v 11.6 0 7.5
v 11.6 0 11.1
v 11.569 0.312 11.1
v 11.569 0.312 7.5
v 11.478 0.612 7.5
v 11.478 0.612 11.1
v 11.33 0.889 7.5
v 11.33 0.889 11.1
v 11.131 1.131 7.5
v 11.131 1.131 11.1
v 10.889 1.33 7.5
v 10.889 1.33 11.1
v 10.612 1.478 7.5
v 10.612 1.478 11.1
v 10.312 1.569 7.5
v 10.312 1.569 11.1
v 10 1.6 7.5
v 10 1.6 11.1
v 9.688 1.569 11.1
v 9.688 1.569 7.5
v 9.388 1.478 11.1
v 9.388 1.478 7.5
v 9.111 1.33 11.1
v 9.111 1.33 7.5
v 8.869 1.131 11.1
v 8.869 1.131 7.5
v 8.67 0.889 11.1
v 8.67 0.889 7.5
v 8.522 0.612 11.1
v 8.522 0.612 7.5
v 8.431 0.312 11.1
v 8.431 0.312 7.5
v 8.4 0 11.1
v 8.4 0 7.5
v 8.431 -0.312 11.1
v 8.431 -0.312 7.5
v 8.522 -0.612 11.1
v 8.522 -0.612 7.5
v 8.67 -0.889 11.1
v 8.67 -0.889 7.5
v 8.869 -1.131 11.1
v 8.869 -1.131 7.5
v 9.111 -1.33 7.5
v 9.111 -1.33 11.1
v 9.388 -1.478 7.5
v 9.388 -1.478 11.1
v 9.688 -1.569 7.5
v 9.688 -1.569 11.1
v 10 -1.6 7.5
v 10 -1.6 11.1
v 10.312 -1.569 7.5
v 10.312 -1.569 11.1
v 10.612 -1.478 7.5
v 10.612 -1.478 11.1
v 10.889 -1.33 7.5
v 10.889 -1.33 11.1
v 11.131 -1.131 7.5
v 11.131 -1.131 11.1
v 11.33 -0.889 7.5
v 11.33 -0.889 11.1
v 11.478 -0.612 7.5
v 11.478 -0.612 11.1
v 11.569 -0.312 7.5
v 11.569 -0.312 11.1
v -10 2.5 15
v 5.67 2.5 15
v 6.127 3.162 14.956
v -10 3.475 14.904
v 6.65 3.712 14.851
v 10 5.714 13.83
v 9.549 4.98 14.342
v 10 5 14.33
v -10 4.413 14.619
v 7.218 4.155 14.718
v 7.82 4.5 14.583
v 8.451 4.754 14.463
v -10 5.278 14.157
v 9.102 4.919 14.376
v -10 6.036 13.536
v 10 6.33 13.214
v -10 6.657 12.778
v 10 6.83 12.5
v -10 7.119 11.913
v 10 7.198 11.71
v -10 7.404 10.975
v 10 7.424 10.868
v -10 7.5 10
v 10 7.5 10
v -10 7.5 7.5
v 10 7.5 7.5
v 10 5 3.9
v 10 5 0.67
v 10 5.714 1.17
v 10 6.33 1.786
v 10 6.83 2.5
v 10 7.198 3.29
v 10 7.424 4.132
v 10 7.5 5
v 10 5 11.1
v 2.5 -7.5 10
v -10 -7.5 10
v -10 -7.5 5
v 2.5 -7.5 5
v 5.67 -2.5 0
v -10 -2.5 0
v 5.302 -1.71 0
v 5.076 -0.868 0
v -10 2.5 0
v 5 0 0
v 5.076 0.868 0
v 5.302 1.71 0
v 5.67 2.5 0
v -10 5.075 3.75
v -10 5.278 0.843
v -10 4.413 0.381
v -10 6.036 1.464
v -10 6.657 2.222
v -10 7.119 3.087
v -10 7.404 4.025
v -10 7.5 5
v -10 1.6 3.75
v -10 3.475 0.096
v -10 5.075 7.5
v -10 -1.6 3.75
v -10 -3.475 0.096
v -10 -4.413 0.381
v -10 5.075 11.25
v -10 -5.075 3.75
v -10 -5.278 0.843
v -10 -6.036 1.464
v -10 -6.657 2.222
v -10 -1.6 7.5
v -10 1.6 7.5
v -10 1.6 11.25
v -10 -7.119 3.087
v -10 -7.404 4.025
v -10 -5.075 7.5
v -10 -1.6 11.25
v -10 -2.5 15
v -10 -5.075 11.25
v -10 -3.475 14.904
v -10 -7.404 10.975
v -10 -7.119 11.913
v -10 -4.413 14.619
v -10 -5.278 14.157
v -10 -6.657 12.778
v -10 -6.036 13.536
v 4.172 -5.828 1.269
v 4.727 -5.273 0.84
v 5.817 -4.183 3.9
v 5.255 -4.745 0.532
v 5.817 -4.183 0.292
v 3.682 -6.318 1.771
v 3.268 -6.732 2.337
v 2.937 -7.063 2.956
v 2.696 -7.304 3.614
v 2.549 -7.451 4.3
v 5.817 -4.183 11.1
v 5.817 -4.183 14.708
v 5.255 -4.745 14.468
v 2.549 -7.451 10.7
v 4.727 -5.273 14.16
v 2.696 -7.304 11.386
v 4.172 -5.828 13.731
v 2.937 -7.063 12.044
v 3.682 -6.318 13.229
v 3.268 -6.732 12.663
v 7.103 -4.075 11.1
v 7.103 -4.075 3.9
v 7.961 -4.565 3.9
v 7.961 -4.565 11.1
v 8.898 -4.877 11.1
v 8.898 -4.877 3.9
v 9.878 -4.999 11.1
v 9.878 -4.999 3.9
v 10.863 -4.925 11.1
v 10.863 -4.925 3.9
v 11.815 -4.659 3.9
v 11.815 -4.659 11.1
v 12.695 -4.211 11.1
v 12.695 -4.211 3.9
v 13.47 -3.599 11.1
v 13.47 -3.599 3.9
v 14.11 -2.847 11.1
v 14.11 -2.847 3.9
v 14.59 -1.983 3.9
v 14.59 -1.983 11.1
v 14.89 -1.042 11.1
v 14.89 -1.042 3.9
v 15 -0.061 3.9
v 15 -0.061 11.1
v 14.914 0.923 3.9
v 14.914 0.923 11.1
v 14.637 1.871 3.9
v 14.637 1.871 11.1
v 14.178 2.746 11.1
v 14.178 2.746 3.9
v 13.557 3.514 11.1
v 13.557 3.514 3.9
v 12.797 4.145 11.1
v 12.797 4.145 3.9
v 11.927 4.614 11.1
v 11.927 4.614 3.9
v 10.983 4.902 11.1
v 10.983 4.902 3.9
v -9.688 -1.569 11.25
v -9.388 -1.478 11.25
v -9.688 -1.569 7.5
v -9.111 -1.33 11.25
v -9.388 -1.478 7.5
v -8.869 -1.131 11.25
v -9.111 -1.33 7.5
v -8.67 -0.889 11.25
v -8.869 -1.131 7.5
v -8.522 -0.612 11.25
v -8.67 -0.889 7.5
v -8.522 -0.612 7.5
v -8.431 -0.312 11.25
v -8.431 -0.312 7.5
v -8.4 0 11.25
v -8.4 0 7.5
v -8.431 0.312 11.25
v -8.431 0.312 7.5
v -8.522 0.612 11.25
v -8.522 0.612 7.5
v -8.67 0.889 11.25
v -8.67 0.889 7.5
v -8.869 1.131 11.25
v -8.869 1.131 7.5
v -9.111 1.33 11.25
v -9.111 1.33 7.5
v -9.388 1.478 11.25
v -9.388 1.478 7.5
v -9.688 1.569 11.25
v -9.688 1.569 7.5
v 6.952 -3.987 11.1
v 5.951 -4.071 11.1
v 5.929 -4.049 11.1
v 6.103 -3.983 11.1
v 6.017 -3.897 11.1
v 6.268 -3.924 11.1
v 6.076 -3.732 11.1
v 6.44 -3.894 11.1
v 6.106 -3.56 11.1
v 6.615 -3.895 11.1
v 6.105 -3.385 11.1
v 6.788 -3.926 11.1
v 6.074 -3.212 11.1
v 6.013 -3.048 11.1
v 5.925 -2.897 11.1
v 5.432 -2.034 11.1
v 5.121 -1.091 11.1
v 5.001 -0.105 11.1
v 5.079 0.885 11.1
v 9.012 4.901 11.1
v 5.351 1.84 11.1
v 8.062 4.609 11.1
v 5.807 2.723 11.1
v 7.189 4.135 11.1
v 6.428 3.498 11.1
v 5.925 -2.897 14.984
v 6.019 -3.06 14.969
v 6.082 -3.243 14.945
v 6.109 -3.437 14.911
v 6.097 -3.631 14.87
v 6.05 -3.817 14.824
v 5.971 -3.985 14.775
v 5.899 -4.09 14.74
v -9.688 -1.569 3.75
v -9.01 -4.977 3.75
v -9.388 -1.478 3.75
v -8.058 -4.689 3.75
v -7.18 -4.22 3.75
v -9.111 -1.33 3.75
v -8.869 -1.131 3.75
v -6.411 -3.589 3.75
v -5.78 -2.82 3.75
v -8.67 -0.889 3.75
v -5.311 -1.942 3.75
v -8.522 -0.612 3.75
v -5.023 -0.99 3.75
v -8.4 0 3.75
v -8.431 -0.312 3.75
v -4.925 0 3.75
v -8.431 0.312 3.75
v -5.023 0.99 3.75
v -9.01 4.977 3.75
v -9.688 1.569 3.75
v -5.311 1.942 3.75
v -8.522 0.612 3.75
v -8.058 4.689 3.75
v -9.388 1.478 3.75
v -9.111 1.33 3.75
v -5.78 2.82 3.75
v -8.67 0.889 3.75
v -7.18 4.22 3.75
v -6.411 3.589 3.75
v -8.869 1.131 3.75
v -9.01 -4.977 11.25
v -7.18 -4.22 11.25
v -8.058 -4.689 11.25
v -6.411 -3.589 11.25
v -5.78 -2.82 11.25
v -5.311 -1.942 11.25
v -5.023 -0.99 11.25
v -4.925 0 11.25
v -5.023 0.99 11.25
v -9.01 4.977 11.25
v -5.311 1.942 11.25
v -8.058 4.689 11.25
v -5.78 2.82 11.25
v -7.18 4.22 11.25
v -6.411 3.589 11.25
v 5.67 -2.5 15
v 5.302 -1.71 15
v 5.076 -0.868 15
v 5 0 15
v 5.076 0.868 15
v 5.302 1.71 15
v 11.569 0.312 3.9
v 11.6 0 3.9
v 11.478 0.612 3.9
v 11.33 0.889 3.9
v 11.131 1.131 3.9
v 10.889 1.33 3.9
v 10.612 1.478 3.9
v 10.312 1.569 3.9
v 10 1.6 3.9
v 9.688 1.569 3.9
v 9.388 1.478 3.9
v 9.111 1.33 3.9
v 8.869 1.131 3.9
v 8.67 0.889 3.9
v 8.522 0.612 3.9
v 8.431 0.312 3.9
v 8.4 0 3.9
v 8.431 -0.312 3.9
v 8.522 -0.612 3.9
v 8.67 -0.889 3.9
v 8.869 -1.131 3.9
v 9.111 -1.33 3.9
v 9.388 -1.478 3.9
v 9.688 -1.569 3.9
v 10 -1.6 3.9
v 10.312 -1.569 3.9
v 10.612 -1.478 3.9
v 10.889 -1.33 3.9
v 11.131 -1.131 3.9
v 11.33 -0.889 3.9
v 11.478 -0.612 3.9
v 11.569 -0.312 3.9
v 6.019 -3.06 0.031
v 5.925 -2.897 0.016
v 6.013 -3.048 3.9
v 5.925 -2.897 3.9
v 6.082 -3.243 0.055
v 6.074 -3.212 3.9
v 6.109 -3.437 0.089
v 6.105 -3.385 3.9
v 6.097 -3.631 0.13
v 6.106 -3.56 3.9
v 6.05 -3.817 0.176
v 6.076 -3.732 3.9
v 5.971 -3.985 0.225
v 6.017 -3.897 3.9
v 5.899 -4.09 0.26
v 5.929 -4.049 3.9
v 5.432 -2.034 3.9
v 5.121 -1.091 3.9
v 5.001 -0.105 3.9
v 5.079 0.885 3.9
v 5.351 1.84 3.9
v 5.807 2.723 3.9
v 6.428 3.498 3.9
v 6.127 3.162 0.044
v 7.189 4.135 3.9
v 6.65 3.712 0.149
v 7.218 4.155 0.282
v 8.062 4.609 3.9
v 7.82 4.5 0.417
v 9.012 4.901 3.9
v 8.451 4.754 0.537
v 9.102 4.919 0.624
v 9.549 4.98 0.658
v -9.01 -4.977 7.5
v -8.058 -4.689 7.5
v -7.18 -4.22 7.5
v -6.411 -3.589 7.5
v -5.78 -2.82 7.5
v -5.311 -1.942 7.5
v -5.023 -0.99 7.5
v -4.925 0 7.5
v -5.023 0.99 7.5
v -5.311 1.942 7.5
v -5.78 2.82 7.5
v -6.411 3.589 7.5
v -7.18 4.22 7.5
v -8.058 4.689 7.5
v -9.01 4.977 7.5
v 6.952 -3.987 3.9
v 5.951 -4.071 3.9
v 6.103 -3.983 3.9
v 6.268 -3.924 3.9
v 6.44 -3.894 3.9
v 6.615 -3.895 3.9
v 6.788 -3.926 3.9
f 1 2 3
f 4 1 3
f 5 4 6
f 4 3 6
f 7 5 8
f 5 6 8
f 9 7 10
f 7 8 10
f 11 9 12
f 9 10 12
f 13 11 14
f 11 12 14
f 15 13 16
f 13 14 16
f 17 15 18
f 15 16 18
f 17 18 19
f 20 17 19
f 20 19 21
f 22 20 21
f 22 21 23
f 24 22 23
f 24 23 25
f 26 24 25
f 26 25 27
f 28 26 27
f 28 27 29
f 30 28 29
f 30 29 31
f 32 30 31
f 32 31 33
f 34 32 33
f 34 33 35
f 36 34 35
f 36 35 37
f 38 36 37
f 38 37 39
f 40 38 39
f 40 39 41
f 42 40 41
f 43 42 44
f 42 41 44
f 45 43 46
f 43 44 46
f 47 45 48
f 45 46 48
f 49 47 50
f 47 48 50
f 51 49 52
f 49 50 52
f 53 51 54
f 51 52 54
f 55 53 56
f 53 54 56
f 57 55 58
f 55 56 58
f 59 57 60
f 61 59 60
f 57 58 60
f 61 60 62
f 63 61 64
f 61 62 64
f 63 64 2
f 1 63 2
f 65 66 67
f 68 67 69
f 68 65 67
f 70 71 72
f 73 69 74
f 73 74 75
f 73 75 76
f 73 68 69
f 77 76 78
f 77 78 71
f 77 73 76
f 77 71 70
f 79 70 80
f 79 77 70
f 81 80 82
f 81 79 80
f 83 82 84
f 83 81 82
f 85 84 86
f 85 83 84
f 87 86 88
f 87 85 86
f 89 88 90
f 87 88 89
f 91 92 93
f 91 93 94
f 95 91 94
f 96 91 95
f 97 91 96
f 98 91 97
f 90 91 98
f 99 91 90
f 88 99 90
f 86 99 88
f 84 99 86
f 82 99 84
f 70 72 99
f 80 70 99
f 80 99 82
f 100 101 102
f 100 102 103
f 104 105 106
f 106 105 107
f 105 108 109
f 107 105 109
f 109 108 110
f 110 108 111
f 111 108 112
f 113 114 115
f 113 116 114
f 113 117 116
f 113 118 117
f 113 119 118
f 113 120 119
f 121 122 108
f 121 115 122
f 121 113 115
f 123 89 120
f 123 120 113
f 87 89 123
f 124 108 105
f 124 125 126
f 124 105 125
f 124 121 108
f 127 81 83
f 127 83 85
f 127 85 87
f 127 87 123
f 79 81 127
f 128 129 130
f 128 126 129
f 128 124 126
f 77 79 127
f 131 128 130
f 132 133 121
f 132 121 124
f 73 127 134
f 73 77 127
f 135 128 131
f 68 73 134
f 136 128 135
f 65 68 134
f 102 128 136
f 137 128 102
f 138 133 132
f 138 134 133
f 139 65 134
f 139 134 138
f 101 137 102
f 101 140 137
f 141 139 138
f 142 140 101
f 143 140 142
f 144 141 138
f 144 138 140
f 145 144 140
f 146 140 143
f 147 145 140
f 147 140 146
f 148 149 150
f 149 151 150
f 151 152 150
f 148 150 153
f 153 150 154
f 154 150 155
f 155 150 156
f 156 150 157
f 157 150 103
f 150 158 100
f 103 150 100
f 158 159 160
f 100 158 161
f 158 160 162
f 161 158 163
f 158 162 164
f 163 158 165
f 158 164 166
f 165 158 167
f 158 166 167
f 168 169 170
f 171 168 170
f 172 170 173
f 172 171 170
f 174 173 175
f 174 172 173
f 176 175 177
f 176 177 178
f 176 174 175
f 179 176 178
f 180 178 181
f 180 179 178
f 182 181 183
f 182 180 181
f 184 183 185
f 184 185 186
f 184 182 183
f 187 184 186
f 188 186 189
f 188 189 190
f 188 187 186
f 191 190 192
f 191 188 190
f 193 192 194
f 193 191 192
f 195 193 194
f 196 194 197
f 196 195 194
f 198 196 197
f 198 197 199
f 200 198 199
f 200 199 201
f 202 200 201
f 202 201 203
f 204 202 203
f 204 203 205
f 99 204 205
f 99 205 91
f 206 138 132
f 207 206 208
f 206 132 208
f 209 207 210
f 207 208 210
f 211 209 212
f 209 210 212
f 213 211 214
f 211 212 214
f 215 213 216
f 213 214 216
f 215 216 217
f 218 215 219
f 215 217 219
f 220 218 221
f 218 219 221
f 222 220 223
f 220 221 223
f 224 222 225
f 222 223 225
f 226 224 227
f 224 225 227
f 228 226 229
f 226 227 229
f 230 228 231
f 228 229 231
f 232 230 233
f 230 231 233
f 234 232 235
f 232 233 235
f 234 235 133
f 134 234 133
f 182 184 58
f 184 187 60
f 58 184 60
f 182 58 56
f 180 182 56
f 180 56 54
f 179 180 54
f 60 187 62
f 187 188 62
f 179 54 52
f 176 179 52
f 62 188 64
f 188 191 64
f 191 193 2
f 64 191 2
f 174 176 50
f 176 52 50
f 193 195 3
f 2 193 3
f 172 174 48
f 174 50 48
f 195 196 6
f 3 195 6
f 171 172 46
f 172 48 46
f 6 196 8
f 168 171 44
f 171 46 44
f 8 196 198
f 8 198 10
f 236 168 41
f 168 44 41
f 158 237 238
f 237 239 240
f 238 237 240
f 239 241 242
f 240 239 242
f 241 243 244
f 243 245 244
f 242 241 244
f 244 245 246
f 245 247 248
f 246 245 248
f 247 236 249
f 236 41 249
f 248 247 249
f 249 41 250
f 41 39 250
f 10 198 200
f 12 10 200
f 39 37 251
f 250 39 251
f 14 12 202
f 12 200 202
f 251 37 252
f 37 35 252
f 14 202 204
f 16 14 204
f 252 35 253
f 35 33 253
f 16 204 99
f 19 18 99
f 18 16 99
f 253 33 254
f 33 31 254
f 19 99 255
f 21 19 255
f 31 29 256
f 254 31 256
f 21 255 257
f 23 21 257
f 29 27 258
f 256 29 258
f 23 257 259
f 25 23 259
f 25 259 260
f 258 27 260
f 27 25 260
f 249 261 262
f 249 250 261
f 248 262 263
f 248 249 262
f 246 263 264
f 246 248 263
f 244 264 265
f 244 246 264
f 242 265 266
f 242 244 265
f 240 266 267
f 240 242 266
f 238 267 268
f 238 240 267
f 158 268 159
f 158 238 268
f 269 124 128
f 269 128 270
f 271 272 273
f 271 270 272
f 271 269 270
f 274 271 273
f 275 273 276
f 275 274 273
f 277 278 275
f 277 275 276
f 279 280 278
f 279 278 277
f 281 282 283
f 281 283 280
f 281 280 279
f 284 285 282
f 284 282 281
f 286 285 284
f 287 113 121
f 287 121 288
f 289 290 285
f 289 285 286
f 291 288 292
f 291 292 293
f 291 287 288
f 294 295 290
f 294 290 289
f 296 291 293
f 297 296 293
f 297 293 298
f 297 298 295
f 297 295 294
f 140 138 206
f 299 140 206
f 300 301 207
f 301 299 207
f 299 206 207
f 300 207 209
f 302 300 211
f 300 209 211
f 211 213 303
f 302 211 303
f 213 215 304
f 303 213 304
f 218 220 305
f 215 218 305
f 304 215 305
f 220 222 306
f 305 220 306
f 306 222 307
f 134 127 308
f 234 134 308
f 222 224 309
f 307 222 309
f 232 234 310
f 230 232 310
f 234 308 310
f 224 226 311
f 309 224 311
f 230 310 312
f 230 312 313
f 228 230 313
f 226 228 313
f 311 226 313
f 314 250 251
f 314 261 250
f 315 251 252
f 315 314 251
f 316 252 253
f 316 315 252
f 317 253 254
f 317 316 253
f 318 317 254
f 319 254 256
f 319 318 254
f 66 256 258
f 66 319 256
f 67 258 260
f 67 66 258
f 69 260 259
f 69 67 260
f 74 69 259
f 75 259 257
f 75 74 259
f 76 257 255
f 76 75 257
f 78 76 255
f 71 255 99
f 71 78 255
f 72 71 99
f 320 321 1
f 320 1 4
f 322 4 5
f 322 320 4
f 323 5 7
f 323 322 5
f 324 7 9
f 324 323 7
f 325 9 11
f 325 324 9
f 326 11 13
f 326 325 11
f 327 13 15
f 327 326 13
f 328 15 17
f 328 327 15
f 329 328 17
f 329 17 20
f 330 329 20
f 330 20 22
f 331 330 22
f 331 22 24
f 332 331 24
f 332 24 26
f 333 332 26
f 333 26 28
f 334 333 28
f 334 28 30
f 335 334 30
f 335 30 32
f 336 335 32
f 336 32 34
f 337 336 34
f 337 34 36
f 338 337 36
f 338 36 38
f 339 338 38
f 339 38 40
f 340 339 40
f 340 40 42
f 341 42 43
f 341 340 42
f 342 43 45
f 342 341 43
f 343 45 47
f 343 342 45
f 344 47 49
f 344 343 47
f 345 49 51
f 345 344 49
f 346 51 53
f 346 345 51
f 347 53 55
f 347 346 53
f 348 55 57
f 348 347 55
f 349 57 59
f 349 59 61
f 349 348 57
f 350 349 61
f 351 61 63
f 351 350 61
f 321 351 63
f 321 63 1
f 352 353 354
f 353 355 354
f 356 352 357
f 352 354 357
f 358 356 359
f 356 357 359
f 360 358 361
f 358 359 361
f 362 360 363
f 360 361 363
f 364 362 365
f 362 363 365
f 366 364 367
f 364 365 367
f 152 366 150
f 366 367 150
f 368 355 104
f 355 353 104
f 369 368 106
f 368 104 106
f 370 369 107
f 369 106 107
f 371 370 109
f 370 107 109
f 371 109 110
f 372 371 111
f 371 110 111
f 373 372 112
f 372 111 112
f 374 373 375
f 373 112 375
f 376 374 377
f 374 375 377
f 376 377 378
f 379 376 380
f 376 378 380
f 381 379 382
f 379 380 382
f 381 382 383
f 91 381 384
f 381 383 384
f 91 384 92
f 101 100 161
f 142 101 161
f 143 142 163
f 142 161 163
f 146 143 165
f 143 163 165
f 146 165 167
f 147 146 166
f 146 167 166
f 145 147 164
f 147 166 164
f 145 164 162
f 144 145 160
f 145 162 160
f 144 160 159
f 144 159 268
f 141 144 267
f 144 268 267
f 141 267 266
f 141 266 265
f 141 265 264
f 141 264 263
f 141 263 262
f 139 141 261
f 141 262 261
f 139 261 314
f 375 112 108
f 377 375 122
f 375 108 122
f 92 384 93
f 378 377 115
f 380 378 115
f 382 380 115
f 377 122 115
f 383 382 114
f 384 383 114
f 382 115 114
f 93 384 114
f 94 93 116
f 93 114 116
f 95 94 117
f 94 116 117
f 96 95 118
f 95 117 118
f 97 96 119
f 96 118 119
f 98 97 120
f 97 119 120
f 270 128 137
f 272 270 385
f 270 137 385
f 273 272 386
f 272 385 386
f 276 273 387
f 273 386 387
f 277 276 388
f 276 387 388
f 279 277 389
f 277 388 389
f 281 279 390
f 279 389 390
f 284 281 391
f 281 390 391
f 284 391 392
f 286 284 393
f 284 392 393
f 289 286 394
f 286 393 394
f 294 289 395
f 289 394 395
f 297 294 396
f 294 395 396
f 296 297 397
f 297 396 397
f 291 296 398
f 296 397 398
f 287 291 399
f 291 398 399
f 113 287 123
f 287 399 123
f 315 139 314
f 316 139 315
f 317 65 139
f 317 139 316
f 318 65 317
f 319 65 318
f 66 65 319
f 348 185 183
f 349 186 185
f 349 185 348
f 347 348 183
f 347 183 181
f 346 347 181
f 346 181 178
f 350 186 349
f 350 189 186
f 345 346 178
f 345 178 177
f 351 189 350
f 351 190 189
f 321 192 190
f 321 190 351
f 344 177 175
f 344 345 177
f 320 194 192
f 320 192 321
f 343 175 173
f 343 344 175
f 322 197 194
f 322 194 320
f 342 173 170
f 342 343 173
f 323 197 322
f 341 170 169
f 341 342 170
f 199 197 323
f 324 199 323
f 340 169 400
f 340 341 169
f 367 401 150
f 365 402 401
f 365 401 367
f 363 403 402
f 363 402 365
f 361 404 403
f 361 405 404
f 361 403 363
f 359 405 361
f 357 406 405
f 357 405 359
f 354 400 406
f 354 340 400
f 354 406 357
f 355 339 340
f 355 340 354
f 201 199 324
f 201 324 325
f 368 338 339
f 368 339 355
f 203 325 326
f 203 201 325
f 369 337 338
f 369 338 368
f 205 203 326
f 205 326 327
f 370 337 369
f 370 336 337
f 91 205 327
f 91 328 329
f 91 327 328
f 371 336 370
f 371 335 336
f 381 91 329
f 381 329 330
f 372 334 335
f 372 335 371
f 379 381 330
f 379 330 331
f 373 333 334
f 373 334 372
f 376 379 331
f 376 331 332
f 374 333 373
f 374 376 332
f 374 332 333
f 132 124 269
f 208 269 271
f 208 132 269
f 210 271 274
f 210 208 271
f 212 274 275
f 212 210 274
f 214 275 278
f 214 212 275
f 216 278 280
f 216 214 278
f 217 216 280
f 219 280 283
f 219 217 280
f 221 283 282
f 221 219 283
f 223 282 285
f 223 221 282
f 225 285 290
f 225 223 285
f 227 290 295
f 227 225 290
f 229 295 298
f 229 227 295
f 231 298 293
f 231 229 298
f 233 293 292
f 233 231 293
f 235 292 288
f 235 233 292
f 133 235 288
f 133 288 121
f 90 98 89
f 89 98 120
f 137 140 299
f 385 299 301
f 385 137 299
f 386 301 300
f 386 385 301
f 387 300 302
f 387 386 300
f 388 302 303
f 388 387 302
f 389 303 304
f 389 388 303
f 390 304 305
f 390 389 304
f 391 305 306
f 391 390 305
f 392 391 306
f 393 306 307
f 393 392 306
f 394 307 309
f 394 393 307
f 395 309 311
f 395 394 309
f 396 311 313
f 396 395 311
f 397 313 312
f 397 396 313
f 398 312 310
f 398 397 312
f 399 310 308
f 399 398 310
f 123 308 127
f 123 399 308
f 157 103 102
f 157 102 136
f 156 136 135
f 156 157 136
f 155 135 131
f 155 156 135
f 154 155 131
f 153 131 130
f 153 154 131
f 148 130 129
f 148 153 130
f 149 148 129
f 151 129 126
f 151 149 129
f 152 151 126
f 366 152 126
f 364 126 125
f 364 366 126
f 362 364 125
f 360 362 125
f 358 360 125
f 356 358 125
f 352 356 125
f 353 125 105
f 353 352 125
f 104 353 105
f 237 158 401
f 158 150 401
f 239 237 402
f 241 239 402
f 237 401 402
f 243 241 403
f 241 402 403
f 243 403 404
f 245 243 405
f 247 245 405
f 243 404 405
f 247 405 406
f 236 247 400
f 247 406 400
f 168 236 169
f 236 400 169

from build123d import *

# Parameters (mm, degrees)
SKETCH1_R           = 1.6
BOSS_EXTRUDE1_DEPTH = 7.5
SKETCH2_R           = 5.075
SKETCH2_R_2         = 1.6
CUT_EXTRUDE1_DEPTH  = 3.75
FILLET1_R           = 5
SKETCH3_R           = 5
CUT_EXTRUDE2_DEPTH  = 3.9
CUT_EXTRUDE5_DEPTH  = 8.5
FILLET2_R           = 1
FILLET3_R           = 1


with BuildPart() as part:
    # Sketch1 → Boss-Extrude1 (new body)
    with BuildSketch(Plane.XY):
        with BuildLine():
            Line((10, 5), (10, 7.5))
            Line((10, 7.5), (-10, 7.5))
            Line((-10, 7.5), (-10, -7.5))
            Line((-10, -7.5), (10, -7.5))
            Line((10, -7.5), (10, -5))
            ThreePointArc((10, -5), (15, 0), (10, 5))
        make_face()
        with Locations((10, 0)):
            Circle(SKETCH1_R, mode=Mode.SUBTRACT)
    extrude(amount=BOSS_EXTRUDE1_DEPTH)

    # Sketch2 → Cut-Extrude1 (cut)
    with BuildSketch(Plane.XY.offset(7.5)):
        with Locations((-10, 0)):
            Circle(SKETCH2_R)
        with Locations((-10, 0)):
            Circle(SKETCH2_R_2, mode=Mode.SUBTRACT)
    extrude(amount=-CUT_EXTRUDE1_DEPTH, mode=Mode.SUBTRACT)

    # Fillet1
    fillet1_edges = [part.edges().sort_by_distance(p)[0] for p in [
        (0, -7.5, 0),
        (0, 7.5, 0),
    ]]
    fillet(fillet1_edges, radius=FILLET1_R)

    # Sketch3 → Cut-Extrude2 (cut)
    with BuildSketch(Plane(origin=(0, 0, 0), x_dir=(-1, 0, 0), z_dir=(0, 0, -1))):
        with Locations((-10, 0)):
            Circle(SKETCH3_R)
    extrude(amount=-CUT_EXTRUDE2_DEPTH, mode=Mode.SUBTRACT)

    # Sketch5 → Cut-Extrude5 (cut, through all)
    with BuildSketch(Plane(origin=(0, 0, 0), x_dir=(-1, 0, 0), z_dir=(0, 0, -1))):
        with BuildLine():
            Line((-6.464466094, -3.535533906), (-2.5, -7.5))
            Line((-2.5, -7.5), (-10, -7.5))
            Line((-10, -7.5), (-10, -5))
            ThreePointArc((-10, -5), (-8.086582838, -4.619397663), (-6.464466094, -3.535533906))
        make_face()
    extrude(amount=-CUT_EXTRUDE5_DEPTH, mode=Mode.SUBTRACT)

    # Fillet2
    fillet2_edges = [part.edges().sort_by_distance(p)[0] for p in [
        (6.464466094, -3.535533906, 2.00420414),
    ]]
    fillet(fillet2_edges, radius=FILLET2_R)

    # Mirror2: part across plane


with BuildPart() as part_1:
    add(part.part)
    add(part.part.mirror(Plane(origin=(10, 0, 7.5), x_dir=(1, 0, 0), z_dir=(0, 0, 1))))

    # Fillet3
    fillet3_edges = [part_1.edges().sort_by_distance(p)[0] for p in [
        (6.464466094, -3.535533906, 7.5),
    ]]
    fillet(fillet3_edges, radius=FILLET3_R)


solid = part_1.part
